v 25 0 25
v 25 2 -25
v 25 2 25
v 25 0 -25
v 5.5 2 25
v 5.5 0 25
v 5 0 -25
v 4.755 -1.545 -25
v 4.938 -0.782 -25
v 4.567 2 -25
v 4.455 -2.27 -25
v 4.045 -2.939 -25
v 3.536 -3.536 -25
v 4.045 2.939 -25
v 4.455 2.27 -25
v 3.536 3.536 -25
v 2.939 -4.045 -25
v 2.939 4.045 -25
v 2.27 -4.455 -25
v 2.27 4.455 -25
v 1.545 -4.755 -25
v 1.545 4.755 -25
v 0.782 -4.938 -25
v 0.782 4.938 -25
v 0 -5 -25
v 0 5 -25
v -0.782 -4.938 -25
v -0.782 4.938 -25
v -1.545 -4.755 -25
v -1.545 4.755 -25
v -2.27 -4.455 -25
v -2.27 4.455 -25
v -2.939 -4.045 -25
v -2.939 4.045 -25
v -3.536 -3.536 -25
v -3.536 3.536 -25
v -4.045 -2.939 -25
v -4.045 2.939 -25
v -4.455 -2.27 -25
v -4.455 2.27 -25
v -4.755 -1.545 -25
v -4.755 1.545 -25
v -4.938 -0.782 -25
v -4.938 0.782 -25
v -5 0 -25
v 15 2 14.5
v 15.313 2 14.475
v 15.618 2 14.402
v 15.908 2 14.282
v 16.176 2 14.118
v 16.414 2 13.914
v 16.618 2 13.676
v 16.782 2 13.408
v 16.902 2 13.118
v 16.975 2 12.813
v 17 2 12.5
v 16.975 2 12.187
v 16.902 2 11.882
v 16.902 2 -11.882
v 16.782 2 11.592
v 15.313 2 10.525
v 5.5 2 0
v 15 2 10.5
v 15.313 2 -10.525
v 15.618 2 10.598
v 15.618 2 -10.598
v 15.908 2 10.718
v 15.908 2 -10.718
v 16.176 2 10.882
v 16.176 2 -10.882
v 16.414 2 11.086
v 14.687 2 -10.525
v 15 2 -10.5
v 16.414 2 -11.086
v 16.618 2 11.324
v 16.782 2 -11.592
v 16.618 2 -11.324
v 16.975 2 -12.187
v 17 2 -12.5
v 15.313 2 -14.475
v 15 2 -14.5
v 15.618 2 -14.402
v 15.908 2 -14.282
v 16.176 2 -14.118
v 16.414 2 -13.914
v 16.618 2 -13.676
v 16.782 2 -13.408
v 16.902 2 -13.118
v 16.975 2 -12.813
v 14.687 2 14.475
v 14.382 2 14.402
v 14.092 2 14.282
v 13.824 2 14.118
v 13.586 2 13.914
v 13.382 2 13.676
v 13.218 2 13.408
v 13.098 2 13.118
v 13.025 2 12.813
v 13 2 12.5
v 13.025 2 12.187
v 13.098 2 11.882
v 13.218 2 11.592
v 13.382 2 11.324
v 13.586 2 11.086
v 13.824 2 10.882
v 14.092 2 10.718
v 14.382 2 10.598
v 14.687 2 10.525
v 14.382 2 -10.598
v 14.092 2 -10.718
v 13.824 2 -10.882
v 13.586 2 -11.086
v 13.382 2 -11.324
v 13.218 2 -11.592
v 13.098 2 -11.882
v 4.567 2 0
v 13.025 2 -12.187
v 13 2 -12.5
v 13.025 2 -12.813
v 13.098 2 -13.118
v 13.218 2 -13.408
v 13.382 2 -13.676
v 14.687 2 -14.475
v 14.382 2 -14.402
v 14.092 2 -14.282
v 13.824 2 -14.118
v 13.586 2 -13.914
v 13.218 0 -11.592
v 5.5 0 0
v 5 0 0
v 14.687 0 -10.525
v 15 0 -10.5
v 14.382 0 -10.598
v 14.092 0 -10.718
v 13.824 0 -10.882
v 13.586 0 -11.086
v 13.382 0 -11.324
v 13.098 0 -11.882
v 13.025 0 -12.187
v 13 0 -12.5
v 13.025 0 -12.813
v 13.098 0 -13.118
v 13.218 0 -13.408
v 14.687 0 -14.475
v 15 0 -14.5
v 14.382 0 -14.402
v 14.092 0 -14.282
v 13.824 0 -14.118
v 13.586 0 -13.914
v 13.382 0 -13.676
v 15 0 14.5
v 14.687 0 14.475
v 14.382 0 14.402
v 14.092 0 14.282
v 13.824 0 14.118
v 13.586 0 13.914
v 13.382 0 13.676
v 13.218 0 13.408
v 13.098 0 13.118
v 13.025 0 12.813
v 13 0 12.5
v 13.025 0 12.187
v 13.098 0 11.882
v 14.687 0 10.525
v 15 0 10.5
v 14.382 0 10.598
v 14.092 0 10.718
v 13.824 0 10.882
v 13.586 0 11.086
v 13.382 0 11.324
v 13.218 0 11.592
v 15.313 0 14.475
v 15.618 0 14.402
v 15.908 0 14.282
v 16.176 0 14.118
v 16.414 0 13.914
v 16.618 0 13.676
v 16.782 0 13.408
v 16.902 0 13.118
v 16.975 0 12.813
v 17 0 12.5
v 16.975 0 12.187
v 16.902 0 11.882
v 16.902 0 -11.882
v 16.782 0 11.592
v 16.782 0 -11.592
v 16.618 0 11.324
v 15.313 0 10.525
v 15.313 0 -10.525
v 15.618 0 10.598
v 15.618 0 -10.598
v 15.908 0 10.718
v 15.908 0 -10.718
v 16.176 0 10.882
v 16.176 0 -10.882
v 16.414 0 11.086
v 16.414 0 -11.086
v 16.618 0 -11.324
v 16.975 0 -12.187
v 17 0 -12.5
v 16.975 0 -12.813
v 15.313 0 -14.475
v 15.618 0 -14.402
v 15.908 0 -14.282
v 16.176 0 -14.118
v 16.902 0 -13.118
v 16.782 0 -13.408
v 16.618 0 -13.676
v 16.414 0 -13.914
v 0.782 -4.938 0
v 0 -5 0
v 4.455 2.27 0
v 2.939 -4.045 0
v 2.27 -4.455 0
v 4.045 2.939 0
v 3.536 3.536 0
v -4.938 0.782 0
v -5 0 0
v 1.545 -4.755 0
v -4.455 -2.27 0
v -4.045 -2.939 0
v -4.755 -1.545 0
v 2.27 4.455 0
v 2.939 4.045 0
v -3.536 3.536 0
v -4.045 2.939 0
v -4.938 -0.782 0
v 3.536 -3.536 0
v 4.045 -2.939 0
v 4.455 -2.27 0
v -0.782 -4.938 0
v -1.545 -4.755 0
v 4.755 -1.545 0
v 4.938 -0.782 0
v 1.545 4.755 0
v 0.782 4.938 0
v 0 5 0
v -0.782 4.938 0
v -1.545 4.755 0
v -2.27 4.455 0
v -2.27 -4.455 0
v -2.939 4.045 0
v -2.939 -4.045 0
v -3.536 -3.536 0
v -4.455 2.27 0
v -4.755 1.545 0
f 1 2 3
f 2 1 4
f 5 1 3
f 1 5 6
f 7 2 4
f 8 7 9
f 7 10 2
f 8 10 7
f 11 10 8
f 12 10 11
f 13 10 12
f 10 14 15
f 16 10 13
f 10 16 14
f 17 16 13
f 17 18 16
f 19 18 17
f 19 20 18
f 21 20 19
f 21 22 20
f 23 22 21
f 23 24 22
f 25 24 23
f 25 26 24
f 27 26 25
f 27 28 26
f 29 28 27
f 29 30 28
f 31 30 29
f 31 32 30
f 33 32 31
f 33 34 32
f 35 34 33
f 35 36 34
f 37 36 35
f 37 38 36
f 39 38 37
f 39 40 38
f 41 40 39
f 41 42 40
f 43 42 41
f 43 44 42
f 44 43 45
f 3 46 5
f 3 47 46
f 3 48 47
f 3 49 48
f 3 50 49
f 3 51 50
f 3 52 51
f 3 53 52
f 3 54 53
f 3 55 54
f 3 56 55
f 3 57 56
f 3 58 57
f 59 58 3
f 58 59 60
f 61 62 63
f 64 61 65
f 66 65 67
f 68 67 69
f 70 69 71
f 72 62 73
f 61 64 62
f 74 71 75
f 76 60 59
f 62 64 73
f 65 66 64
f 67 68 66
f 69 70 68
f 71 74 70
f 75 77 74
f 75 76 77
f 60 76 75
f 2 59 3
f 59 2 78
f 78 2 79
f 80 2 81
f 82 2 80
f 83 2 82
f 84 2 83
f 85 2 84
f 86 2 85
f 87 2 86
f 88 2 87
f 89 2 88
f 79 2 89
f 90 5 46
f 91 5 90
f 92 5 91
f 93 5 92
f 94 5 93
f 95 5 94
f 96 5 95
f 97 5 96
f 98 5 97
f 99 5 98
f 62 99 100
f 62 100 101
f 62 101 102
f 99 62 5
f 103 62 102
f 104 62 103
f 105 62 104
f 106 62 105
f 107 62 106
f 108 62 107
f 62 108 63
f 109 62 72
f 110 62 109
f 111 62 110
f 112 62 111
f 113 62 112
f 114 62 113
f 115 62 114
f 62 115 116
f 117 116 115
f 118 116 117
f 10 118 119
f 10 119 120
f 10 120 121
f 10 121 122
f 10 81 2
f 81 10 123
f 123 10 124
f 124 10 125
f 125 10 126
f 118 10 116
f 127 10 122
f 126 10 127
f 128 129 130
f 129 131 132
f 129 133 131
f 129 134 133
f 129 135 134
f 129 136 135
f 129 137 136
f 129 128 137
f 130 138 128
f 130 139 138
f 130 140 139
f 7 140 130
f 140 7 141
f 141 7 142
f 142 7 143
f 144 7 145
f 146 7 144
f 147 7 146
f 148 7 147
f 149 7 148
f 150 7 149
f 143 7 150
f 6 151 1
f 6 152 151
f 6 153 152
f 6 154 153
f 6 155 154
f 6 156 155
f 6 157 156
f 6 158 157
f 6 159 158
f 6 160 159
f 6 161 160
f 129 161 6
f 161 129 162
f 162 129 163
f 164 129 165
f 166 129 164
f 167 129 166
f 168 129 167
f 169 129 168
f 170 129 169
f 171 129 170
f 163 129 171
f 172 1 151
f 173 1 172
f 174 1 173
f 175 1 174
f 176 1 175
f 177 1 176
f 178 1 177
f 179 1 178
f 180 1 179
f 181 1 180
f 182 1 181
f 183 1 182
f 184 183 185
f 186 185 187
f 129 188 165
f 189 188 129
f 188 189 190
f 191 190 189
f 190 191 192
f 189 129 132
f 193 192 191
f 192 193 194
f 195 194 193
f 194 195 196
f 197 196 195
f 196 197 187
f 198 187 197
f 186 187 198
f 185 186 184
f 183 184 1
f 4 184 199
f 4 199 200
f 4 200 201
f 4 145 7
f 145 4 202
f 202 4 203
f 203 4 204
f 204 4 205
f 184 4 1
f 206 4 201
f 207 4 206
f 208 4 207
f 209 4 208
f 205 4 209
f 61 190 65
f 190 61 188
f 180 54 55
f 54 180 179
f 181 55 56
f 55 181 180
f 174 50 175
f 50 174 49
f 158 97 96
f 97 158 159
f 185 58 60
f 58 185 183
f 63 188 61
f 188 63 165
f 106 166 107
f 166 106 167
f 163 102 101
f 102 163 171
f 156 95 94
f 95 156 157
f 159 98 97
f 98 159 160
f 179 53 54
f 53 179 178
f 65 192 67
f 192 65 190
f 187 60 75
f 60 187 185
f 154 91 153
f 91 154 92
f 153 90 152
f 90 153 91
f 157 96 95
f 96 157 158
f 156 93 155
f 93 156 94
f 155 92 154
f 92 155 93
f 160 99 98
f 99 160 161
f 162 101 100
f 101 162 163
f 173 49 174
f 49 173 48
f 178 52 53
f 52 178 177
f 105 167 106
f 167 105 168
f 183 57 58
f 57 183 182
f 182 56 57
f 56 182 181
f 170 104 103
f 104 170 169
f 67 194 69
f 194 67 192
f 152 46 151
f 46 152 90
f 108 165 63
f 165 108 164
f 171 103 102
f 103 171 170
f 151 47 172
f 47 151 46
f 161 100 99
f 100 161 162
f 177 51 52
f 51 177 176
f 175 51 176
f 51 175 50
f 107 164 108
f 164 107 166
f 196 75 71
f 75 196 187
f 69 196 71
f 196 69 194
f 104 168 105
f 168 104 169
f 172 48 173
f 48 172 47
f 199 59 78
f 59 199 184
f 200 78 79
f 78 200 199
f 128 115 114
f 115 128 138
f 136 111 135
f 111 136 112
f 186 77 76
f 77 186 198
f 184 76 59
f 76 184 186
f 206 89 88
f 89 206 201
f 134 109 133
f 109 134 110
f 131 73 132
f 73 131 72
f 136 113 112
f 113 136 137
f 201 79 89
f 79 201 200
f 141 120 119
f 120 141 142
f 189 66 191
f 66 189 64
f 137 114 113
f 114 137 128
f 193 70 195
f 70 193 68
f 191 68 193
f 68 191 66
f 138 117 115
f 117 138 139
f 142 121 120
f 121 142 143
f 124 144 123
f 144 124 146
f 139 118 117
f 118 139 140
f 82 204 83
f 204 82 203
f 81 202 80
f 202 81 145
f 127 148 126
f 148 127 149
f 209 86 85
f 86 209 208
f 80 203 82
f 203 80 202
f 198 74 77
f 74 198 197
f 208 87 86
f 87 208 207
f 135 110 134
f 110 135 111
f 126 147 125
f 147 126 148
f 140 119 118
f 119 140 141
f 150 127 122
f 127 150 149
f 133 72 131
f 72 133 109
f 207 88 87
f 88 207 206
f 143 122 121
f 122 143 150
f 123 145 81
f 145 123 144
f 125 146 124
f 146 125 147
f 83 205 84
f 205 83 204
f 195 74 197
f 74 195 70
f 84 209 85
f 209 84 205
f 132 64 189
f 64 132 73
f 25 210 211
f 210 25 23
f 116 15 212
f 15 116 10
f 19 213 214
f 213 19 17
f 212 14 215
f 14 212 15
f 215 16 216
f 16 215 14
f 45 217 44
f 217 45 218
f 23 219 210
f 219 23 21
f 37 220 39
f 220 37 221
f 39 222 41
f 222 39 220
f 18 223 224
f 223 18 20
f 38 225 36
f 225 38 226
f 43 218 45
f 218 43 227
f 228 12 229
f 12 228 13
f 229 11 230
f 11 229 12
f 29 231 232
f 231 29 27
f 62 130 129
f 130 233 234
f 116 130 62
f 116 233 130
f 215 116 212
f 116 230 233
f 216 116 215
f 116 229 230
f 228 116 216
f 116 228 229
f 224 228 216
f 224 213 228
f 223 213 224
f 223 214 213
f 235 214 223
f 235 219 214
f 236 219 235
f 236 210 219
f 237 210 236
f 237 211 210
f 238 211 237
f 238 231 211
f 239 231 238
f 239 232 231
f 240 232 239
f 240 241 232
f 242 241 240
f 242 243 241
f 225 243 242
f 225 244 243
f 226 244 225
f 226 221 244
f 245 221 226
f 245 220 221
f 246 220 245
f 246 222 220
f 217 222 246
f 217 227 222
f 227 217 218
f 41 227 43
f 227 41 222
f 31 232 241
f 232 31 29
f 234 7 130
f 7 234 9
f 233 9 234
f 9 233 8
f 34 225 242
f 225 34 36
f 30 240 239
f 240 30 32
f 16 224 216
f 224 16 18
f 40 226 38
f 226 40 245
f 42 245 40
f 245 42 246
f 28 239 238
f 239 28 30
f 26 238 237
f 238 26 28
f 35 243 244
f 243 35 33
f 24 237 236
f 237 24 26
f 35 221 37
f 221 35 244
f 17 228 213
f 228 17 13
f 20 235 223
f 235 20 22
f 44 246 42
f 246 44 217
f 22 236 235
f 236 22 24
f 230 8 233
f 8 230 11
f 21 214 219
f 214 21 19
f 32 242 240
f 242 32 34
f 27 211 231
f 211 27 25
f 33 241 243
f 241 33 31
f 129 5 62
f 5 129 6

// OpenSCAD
// Define module for reusable hinge base
module drawHingeBase(wingWidth, wingHeight, wingDepth, drillRadius, knuckleRadius, notchLength){
  difference(){
    union(){
      translate([wingWidth/2, wingDepth/2, 0]){
        difference(){
          
          // This draws a wing
          cube([wingWidth, wingDepth, wingHeight], center = true);

          // This draws the upper hole drill
          translate([knuckleRadius / 2, 0, wingHeight / 4]){
            wingHoleDrill(wingDepth, drillRadius);
          }

          // This draws the lower hole drill
          translate([knuckleRadius / 2, 0, -wingHeight / 4]){
            wingHoleDrill(wingDepth, drillRadius);
          }
        }
      }
    
      // Draw bottom part of the knuckle
      translate([0, 0, -wingHeight / 4]){
        cylinder(h = wingHeight / 2, r = knuckleRadius, center = true, $fn = 40);
      }
    }

    // Draw the top part of the knuckle that will be used 
    // for biting off a part of the wing.
    translate([0, 0, wingHeight / 4]){
      cube([knuckleRadius * 2 + notchLength, knuckleRadius * 2, wingHeight / 2], center = true);
    }  
  }
}

// Define the reusable drill for the holes in the wing
module wingHoleDrill(wingDepth, drillRadius){
  rotate([90, 0, 0]){
    cylinder(h = wingDepth + 10, r = drillRadius, center = true, $fn = 40);
  }
}

// This function call will be discarded if "use" is used 
// instead of "include". We leave it here to be able to get visual feedback here.
drawHingeBase(25, 50, 2, 2, 5, 1);
